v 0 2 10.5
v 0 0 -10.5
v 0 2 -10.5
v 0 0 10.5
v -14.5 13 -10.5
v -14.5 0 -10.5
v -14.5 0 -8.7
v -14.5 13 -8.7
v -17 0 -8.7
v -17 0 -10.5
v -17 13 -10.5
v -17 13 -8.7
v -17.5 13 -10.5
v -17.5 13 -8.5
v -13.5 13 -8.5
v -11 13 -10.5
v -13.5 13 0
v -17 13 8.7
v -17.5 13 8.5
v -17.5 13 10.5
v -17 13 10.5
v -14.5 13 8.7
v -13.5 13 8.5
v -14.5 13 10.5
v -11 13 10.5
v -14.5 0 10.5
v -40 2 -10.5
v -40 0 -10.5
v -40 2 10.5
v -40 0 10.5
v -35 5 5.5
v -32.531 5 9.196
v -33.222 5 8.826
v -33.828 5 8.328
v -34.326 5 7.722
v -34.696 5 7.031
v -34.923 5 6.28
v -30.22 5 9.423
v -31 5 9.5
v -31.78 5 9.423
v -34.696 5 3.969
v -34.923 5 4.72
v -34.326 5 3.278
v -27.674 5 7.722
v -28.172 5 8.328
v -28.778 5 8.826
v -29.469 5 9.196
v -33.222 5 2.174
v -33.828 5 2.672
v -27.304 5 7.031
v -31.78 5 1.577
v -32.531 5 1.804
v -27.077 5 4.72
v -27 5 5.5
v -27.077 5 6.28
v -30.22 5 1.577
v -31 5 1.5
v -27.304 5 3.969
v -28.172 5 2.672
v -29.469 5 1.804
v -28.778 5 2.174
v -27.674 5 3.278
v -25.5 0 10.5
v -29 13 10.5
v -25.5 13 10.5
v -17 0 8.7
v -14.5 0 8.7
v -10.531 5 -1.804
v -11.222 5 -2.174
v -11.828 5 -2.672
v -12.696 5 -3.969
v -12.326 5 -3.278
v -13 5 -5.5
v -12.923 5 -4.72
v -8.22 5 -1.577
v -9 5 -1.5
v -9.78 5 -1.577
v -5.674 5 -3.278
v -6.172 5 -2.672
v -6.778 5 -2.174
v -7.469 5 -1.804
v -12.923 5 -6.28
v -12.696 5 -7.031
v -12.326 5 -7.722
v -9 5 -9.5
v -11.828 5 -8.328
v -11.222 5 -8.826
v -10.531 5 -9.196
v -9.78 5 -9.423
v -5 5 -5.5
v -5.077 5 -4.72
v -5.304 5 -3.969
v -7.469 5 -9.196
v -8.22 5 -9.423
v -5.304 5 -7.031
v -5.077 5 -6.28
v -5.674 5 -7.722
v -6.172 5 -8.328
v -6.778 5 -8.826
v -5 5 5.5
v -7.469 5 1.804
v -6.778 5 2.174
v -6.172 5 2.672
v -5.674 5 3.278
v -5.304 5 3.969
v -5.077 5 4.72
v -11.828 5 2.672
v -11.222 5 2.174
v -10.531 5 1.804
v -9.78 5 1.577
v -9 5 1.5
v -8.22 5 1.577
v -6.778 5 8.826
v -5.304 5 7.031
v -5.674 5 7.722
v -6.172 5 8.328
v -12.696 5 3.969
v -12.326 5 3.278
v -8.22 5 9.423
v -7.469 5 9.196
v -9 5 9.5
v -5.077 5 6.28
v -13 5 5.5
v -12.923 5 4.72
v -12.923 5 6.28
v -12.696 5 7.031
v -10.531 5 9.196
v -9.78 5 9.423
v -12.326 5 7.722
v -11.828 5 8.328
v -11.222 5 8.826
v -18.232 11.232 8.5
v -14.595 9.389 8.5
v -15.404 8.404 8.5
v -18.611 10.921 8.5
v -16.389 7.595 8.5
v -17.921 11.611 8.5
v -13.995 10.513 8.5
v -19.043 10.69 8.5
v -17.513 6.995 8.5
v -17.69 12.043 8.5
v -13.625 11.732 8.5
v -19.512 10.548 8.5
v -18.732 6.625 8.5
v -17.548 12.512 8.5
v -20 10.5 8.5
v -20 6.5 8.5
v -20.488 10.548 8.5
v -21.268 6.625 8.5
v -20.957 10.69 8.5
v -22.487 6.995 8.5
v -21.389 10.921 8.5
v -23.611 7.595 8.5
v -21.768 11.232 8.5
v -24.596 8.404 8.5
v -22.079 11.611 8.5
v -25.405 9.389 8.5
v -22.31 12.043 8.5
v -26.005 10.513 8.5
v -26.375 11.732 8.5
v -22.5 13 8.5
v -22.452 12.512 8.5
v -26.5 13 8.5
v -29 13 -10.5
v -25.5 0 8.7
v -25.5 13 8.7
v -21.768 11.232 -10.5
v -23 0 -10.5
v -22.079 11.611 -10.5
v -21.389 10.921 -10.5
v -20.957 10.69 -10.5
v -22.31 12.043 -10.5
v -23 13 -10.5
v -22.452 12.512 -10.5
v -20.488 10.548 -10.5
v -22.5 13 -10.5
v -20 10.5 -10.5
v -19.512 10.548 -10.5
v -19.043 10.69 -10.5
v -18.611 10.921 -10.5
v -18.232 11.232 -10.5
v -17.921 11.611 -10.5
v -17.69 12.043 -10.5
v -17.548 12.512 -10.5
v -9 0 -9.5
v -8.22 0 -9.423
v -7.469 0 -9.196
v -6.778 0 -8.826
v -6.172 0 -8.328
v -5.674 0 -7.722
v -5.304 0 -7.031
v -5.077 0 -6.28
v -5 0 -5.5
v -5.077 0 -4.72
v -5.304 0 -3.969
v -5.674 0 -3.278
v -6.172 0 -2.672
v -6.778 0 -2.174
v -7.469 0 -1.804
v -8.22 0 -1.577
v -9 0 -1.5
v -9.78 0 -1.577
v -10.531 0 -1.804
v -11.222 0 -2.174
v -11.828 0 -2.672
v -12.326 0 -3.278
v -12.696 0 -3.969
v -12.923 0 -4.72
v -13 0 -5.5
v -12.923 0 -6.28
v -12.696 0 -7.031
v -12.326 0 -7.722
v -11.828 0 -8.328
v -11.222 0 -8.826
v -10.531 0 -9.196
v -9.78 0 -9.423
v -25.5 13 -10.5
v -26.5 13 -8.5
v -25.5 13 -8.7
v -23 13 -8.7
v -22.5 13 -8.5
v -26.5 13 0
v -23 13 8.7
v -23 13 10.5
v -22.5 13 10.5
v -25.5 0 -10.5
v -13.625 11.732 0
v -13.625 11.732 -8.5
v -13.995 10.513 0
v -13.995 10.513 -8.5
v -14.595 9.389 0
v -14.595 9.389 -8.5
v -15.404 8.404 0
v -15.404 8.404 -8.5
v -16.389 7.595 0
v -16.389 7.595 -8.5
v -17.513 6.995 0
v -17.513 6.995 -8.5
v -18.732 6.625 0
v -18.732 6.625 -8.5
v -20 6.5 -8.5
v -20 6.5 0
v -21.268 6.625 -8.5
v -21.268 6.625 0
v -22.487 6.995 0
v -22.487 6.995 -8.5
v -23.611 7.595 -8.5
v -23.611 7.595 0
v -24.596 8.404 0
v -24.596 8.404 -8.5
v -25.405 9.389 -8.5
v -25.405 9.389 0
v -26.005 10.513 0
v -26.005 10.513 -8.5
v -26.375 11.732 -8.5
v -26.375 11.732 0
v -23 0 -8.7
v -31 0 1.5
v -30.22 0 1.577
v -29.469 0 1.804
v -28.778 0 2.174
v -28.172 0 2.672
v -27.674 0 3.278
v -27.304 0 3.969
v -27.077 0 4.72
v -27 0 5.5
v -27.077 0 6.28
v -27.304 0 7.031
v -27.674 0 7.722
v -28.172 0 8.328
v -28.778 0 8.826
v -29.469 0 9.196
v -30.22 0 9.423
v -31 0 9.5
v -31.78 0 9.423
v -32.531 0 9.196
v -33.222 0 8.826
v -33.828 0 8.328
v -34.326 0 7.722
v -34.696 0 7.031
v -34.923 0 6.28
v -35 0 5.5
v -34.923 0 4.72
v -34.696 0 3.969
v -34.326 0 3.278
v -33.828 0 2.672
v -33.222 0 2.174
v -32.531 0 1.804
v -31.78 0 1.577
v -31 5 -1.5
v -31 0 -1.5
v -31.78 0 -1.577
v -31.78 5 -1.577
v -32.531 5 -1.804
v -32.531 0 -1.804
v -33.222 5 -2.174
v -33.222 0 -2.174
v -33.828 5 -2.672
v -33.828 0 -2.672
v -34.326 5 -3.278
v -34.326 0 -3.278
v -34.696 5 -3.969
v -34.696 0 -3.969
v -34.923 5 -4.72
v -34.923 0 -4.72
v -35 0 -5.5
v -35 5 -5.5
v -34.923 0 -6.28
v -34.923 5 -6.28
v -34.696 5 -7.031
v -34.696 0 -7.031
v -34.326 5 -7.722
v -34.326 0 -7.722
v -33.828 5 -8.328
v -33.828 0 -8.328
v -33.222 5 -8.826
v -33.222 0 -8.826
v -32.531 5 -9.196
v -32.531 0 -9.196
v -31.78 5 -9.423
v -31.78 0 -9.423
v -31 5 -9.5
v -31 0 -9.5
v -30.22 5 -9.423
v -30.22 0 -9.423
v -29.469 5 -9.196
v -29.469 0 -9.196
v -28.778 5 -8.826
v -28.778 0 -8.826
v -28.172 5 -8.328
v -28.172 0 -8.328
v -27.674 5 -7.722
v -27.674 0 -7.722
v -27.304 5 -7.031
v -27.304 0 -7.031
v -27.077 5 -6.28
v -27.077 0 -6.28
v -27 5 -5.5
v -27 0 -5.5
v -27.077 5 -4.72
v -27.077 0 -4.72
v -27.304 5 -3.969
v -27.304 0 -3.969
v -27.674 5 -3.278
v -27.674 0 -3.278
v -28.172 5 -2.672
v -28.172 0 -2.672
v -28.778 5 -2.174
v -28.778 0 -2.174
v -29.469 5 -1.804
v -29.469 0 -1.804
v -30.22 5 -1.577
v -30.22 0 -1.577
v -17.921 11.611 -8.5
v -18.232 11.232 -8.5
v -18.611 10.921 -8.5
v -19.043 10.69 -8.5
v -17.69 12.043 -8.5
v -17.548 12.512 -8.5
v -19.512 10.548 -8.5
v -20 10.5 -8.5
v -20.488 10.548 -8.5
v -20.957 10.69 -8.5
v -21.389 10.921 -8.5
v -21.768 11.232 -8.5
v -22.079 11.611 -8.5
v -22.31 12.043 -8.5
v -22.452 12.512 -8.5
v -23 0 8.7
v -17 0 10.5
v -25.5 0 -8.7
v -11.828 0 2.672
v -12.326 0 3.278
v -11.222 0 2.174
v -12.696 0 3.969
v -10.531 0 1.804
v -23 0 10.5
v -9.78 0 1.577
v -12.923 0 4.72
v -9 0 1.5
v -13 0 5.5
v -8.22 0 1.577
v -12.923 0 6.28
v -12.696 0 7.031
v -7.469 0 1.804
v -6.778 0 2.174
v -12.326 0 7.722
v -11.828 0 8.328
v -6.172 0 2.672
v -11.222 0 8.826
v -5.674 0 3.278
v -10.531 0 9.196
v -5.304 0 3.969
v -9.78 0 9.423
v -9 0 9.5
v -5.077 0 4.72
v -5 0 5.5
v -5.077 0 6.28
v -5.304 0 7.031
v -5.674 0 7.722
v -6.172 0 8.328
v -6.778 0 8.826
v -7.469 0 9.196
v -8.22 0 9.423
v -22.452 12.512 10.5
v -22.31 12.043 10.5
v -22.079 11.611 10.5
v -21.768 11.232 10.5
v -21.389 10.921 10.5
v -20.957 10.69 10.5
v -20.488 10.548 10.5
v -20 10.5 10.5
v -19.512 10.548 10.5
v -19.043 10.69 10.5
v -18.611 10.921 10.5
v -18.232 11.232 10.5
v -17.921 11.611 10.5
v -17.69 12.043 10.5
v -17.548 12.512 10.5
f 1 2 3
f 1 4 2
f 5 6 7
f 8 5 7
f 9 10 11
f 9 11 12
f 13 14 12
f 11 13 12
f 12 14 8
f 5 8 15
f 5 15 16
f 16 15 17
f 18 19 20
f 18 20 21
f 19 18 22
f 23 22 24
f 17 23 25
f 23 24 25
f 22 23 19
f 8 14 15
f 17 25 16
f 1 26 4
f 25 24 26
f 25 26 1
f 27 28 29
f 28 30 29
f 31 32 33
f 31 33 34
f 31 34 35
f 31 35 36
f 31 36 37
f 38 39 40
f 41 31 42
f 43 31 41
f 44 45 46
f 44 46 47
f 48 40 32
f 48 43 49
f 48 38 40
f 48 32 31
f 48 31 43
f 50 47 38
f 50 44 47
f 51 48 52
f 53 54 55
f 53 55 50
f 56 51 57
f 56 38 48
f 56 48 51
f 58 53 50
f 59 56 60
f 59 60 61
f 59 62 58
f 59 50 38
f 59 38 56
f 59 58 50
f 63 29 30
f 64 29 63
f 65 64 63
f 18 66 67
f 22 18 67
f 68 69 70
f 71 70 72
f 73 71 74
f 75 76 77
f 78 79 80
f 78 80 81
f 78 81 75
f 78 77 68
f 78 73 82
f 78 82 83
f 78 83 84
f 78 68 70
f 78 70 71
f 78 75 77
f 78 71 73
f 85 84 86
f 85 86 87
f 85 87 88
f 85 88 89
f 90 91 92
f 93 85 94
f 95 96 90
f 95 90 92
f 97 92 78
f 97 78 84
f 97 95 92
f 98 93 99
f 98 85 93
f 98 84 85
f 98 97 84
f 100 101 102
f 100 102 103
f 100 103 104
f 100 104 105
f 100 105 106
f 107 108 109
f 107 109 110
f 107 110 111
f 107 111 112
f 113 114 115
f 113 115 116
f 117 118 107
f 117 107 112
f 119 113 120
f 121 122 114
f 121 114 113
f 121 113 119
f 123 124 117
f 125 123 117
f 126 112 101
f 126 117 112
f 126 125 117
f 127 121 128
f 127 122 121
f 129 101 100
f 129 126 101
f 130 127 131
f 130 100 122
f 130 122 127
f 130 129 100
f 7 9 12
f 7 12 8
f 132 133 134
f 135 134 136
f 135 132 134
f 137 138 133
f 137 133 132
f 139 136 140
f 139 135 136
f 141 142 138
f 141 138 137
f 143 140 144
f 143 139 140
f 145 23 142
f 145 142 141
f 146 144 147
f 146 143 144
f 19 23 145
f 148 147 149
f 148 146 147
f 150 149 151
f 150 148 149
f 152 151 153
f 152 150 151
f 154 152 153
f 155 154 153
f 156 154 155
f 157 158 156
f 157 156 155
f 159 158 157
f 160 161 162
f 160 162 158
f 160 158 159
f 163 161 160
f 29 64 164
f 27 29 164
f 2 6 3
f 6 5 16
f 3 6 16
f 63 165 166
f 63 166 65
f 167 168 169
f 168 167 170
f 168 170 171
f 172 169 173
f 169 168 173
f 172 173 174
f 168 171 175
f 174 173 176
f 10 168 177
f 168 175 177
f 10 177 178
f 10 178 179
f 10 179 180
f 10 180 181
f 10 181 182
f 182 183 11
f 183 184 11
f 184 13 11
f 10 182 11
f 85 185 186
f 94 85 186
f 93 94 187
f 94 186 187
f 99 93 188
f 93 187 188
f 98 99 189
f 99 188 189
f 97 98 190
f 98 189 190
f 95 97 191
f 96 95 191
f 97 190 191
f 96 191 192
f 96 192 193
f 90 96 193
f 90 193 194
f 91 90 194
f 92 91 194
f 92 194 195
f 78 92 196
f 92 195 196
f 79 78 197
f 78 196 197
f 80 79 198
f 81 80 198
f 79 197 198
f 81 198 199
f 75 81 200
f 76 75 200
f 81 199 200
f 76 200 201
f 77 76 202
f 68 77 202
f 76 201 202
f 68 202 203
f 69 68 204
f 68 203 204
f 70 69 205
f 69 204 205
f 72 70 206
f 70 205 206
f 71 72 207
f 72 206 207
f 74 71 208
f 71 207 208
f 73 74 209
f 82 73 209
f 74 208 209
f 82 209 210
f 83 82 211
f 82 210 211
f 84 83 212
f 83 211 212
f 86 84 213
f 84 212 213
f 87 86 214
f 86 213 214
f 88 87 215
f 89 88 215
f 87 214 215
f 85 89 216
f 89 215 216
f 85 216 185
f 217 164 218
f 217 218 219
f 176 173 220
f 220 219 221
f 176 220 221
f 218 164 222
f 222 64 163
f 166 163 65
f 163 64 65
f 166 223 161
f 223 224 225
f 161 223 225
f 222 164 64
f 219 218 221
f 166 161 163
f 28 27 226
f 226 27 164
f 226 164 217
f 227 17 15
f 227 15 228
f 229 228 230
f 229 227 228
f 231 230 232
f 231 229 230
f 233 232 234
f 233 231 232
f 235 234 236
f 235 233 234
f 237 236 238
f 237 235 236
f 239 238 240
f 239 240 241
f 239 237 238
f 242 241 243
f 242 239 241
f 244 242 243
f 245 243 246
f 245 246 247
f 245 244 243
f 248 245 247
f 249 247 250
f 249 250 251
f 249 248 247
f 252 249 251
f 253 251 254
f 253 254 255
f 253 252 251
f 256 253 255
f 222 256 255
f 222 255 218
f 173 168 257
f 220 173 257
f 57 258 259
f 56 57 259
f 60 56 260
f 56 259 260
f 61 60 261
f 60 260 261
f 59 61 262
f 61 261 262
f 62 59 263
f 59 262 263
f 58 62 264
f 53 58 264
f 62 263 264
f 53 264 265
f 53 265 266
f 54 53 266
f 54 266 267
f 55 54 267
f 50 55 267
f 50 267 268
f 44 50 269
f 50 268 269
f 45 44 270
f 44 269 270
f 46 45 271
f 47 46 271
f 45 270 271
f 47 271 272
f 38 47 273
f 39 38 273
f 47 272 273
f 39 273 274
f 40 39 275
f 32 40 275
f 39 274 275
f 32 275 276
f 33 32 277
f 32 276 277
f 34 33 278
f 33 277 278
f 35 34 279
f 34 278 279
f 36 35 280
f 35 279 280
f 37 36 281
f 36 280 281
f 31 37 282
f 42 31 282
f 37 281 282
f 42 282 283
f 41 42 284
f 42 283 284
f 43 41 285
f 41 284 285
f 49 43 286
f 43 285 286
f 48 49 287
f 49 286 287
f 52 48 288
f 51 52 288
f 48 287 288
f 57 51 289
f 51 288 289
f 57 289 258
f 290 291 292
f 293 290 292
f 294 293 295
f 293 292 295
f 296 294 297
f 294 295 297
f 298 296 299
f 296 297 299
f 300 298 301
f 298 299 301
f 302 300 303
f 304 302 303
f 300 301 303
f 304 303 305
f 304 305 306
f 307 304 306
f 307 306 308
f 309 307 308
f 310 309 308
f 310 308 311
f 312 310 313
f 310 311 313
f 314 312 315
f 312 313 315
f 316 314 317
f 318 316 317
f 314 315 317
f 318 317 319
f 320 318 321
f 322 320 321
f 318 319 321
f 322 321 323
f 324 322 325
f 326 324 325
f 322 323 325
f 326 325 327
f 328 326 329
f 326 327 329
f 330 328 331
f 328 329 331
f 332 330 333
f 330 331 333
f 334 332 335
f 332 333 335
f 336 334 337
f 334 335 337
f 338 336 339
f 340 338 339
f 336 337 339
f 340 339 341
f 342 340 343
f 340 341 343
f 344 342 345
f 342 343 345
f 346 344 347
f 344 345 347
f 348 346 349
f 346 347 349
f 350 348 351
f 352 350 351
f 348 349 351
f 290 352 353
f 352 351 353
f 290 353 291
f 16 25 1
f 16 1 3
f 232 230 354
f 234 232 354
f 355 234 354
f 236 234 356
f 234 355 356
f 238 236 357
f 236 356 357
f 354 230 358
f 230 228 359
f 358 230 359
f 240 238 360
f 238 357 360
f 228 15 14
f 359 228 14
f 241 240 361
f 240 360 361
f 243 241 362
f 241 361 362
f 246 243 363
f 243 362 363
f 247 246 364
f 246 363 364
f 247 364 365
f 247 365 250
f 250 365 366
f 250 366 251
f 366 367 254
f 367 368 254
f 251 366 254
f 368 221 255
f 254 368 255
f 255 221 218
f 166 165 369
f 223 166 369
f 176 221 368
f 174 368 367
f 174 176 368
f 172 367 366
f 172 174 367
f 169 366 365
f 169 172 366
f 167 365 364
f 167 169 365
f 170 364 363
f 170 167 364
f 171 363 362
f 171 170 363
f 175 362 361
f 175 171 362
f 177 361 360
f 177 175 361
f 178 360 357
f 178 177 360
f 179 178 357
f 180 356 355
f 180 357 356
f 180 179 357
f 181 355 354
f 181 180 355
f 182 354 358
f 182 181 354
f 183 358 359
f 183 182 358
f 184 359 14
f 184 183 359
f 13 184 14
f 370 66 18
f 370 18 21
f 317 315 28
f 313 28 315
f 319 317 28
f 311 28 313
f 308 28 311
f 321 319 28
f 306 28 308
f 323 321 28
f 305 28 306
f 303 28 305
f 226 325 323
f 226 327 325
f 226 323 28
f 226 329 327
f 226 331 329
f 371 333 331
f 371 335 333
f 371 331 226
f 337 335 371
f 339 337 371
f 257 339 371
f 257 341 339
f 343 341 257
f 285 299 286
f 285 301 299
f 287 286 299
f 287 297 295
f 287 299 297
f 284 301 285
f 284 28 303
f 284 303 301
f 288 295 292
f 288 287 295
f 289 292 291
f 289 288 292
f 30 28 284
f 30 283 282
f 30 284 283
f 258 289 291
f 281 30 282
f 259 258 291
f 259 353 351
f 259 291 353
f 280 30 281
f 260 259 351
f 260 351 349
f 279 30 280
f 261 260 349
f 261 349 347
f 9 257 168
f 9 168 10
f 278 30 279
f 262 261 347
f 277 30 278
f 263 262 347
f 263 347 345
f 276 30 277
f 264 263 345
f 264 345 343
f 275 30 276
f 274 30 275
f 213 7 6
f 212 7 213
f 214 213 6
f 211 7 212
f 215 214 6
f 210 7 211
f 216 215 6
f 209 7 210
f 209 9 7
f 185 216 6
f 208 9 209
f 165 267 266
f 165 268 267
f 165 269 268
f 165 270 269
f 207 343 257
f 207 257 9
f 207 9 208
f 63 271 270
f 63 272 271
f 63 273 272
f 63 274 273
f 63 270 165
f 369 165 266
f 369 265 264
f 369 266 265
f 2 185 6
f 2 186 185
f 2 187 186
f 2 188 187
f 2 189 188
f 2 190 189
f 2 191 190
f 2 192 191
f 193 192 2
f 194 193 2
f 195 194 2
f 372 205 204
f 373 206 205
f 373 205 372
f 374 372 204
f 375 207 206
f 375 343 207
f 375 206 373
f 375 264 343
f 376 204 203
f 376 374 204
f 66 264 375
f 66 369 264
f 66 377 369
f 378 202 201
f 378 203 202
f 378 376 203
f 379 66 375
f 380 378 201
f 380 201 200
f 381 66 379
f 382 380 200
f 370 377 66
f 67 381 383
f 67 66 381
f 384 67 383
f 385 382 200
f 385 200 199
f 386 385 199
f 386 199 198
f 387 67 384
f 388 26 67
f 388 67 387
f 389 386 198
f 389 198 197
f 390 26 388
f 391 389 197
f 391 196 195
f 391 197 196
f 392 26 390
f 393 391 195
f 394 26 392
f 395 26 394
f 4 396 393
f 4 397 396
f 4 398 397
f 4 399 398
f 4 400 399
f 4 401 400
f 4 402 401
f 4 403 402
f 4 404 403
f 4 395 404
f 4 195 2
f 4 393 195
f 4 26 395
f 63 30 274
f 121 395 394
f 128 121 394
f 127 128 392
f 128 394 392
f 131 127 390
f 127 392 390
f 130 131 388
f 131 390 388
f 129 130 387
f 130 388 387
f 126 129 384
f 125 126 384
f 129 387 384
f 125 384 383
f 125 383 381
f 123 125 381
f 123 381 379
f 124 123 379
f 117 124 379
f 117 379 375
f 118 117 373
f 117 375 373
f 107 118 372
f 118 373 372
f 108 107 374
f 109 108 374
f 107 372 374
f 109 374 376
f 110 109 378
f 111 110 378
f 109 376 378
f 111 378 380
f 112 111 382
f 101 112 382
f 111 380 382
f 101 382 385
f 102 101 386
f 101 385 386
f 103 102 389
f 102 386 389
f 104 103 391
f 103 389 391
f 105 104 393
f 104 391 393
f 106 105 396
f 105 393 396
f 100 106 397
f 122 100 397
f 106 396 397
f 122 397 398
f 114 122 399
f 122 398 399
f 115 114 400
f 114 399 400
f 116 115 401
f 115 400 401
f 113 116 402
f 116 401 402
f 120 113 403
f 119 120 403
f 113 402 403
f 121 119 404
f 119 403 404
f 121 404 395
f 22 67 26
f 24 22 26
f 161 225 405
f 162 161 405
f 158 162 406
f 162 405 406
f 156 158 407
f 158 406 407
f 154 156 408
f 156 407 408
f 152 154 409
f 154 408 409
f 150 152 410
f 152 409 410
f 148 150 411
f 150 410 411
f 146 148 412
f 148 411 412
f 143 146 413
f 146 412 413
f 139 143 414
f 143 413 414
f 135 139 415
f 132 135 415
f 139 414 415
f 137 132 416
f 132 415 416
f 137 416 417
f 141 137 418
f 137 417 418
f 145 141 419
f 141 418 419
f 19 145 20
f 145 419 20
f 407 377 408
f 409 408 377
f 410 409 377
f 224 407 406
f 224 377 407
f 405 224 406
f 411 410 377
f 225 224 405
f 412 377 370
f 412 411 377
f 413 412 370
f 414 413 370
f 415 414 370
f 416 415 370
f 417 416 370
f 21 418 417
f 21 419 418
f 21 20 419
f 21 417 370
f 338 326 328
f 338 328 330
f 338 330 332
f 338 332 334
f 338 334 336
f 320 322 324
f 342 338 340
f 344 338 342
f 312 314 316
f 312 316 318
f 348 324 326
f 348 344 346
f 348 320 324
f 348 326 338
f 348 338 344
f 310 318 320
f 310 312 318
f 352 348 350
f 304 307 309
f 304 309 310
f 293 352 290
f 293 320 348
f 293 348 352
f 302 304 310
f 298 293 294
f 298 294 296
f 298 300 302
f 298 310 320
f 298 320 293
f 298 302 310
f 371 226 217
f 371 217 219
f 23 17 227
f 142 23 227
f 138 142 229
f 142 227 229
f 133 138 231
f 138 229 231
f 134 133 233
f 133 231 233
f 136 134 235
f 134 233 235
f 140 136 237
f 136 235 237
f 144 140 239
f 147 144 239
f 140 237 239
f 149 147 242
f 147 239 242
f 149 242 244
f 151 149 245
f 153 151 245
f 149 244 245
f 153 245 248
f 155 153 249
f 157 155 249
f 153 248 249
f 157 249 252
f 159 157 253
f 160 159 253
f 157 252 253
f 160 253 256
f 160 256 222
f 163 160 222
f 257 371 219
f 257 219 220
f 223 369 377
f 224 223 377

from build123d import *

# Parameters (mm, degrees)
SKETCH5_W           = 40
SKETCH5_H           = 13
BOSS_EXTRUDE2_DEPTH = 10.5
SKETCH6_R           = 6.5
CUT_EXTRUDE4_DEPTH  = 8.5
SKETCH7_R           = 2.5
CUT_EXTRUDE5_DEPTH  = 4.5
SKETCH8_R           = 4
CUT_EXTRUDE6_DEPTH  = 5
CHAMFER8_SIZE       = 11
SKETCH9_W           = 2.5
SKETCH9_H           = 1.8
CUT_EXTRUDE7_DEPTH  = 15


with BuildPart() as part:
    # Sketch5 → Boss-Extrude2 (new body)
    with BuildSketch(Plane.XY):
        with Locations((-20, 6.5)):
            Rectangle(SKETCH5_W, SKETCH5_H)
    boss_extrude2 = extrude(amount=BOSS_EXTRUDE2_DEPTH)

    # Sketch6 → Cut-Extrude4 (cut)
    with BuildSketch(Plane(origin=(0, 0, 0), x_dir=(-1, 0, 0), z_dir=(0, 0, -1))):
        with Locations((20, 13)):
            Circle(SKETCH6_R)
    cut_extrude4 = extrude(amount=-CUT_EXTRUDE4_DEPTH, mode=Mode.SUBTRACT)

    # Sketch7 → Cut-Extrude5 (cut)
    with BuildSketch(Plane.XY.offset(10.5)):
        with Locations((-20, 13)):
            Circle(SKETCH7_R)
    cut_extrude5 = extrude(amount=-CUT_EXTRUDE5_DEPTH, mode=Mode.SUBTRACT)

    # Mirror5: Boss-Extrude2, Cut-Extrude4, Cut-Extrude5 across plane
    add(boss_extrude2.mirror(Plane.XY))
    add(cut_extrude4.mirror(Plane.XY), mode=Mode.SUBTRACT)
    add(cut_extrude5.mirror(Plane.XY), mode=Mode.SUBTRACT)

    # Sketch8 → Cut-Extrude6 (cut)
    with BuildSketch(Plane.XZ):
        with Locations(Location((-31, 5.5, 0), (0, 0, 270))):
            Circle(SKETCH8_R)
        with Locations(Location((-9, 5.5, 0), (0, 0, 90))):
            Circle(SKETCH8_R)
        with Locations(Location((-9, -5.5, 0), (0, 0, 270))):
            Circle(SKETCH8_R)
        with Locations(Location((-31, -5.5, 0), (0, 0, 90))):
            Circle(SKETCH8_R)
    extrude(amount=-CUT_EXTRUDE6_DEPTH, mode=Mode.SUBTRACT)

    # Chamfer8
    chamfer8_edges = [part.edges().sort_by_distance(p)[0] for p in [
        (-40, 13, 0),
        (0, 13, 0),
    ]]
    chamfer(chamfer8_edges, length=CHAMFER8_SIZE)

    # Sketch9 → Cut-Extrude7 (cut)
    with BuildSketch(Plane.XZ):
        with Locations((-15.75, 9.6)):
            Rectangle(SKETCH9_W, SKETCH9_H)
        with Locations((-24.25, 9.6)):
            Rectangle(SKETCH9_W, SKETCH9_H)
        with Locations((-15.75, -9.6)):
            Rectangle(SKETCH9_W, SKETCH9_H)
        with Locations((-24.25, -9.6)):
            Rectangle(SKETCH9_W, SKETCH9_H)
    extrude(amount=-CUT_EXTRUDE7_DEPTH, mode=Mode.SUBTRACT)


solid = part.part
